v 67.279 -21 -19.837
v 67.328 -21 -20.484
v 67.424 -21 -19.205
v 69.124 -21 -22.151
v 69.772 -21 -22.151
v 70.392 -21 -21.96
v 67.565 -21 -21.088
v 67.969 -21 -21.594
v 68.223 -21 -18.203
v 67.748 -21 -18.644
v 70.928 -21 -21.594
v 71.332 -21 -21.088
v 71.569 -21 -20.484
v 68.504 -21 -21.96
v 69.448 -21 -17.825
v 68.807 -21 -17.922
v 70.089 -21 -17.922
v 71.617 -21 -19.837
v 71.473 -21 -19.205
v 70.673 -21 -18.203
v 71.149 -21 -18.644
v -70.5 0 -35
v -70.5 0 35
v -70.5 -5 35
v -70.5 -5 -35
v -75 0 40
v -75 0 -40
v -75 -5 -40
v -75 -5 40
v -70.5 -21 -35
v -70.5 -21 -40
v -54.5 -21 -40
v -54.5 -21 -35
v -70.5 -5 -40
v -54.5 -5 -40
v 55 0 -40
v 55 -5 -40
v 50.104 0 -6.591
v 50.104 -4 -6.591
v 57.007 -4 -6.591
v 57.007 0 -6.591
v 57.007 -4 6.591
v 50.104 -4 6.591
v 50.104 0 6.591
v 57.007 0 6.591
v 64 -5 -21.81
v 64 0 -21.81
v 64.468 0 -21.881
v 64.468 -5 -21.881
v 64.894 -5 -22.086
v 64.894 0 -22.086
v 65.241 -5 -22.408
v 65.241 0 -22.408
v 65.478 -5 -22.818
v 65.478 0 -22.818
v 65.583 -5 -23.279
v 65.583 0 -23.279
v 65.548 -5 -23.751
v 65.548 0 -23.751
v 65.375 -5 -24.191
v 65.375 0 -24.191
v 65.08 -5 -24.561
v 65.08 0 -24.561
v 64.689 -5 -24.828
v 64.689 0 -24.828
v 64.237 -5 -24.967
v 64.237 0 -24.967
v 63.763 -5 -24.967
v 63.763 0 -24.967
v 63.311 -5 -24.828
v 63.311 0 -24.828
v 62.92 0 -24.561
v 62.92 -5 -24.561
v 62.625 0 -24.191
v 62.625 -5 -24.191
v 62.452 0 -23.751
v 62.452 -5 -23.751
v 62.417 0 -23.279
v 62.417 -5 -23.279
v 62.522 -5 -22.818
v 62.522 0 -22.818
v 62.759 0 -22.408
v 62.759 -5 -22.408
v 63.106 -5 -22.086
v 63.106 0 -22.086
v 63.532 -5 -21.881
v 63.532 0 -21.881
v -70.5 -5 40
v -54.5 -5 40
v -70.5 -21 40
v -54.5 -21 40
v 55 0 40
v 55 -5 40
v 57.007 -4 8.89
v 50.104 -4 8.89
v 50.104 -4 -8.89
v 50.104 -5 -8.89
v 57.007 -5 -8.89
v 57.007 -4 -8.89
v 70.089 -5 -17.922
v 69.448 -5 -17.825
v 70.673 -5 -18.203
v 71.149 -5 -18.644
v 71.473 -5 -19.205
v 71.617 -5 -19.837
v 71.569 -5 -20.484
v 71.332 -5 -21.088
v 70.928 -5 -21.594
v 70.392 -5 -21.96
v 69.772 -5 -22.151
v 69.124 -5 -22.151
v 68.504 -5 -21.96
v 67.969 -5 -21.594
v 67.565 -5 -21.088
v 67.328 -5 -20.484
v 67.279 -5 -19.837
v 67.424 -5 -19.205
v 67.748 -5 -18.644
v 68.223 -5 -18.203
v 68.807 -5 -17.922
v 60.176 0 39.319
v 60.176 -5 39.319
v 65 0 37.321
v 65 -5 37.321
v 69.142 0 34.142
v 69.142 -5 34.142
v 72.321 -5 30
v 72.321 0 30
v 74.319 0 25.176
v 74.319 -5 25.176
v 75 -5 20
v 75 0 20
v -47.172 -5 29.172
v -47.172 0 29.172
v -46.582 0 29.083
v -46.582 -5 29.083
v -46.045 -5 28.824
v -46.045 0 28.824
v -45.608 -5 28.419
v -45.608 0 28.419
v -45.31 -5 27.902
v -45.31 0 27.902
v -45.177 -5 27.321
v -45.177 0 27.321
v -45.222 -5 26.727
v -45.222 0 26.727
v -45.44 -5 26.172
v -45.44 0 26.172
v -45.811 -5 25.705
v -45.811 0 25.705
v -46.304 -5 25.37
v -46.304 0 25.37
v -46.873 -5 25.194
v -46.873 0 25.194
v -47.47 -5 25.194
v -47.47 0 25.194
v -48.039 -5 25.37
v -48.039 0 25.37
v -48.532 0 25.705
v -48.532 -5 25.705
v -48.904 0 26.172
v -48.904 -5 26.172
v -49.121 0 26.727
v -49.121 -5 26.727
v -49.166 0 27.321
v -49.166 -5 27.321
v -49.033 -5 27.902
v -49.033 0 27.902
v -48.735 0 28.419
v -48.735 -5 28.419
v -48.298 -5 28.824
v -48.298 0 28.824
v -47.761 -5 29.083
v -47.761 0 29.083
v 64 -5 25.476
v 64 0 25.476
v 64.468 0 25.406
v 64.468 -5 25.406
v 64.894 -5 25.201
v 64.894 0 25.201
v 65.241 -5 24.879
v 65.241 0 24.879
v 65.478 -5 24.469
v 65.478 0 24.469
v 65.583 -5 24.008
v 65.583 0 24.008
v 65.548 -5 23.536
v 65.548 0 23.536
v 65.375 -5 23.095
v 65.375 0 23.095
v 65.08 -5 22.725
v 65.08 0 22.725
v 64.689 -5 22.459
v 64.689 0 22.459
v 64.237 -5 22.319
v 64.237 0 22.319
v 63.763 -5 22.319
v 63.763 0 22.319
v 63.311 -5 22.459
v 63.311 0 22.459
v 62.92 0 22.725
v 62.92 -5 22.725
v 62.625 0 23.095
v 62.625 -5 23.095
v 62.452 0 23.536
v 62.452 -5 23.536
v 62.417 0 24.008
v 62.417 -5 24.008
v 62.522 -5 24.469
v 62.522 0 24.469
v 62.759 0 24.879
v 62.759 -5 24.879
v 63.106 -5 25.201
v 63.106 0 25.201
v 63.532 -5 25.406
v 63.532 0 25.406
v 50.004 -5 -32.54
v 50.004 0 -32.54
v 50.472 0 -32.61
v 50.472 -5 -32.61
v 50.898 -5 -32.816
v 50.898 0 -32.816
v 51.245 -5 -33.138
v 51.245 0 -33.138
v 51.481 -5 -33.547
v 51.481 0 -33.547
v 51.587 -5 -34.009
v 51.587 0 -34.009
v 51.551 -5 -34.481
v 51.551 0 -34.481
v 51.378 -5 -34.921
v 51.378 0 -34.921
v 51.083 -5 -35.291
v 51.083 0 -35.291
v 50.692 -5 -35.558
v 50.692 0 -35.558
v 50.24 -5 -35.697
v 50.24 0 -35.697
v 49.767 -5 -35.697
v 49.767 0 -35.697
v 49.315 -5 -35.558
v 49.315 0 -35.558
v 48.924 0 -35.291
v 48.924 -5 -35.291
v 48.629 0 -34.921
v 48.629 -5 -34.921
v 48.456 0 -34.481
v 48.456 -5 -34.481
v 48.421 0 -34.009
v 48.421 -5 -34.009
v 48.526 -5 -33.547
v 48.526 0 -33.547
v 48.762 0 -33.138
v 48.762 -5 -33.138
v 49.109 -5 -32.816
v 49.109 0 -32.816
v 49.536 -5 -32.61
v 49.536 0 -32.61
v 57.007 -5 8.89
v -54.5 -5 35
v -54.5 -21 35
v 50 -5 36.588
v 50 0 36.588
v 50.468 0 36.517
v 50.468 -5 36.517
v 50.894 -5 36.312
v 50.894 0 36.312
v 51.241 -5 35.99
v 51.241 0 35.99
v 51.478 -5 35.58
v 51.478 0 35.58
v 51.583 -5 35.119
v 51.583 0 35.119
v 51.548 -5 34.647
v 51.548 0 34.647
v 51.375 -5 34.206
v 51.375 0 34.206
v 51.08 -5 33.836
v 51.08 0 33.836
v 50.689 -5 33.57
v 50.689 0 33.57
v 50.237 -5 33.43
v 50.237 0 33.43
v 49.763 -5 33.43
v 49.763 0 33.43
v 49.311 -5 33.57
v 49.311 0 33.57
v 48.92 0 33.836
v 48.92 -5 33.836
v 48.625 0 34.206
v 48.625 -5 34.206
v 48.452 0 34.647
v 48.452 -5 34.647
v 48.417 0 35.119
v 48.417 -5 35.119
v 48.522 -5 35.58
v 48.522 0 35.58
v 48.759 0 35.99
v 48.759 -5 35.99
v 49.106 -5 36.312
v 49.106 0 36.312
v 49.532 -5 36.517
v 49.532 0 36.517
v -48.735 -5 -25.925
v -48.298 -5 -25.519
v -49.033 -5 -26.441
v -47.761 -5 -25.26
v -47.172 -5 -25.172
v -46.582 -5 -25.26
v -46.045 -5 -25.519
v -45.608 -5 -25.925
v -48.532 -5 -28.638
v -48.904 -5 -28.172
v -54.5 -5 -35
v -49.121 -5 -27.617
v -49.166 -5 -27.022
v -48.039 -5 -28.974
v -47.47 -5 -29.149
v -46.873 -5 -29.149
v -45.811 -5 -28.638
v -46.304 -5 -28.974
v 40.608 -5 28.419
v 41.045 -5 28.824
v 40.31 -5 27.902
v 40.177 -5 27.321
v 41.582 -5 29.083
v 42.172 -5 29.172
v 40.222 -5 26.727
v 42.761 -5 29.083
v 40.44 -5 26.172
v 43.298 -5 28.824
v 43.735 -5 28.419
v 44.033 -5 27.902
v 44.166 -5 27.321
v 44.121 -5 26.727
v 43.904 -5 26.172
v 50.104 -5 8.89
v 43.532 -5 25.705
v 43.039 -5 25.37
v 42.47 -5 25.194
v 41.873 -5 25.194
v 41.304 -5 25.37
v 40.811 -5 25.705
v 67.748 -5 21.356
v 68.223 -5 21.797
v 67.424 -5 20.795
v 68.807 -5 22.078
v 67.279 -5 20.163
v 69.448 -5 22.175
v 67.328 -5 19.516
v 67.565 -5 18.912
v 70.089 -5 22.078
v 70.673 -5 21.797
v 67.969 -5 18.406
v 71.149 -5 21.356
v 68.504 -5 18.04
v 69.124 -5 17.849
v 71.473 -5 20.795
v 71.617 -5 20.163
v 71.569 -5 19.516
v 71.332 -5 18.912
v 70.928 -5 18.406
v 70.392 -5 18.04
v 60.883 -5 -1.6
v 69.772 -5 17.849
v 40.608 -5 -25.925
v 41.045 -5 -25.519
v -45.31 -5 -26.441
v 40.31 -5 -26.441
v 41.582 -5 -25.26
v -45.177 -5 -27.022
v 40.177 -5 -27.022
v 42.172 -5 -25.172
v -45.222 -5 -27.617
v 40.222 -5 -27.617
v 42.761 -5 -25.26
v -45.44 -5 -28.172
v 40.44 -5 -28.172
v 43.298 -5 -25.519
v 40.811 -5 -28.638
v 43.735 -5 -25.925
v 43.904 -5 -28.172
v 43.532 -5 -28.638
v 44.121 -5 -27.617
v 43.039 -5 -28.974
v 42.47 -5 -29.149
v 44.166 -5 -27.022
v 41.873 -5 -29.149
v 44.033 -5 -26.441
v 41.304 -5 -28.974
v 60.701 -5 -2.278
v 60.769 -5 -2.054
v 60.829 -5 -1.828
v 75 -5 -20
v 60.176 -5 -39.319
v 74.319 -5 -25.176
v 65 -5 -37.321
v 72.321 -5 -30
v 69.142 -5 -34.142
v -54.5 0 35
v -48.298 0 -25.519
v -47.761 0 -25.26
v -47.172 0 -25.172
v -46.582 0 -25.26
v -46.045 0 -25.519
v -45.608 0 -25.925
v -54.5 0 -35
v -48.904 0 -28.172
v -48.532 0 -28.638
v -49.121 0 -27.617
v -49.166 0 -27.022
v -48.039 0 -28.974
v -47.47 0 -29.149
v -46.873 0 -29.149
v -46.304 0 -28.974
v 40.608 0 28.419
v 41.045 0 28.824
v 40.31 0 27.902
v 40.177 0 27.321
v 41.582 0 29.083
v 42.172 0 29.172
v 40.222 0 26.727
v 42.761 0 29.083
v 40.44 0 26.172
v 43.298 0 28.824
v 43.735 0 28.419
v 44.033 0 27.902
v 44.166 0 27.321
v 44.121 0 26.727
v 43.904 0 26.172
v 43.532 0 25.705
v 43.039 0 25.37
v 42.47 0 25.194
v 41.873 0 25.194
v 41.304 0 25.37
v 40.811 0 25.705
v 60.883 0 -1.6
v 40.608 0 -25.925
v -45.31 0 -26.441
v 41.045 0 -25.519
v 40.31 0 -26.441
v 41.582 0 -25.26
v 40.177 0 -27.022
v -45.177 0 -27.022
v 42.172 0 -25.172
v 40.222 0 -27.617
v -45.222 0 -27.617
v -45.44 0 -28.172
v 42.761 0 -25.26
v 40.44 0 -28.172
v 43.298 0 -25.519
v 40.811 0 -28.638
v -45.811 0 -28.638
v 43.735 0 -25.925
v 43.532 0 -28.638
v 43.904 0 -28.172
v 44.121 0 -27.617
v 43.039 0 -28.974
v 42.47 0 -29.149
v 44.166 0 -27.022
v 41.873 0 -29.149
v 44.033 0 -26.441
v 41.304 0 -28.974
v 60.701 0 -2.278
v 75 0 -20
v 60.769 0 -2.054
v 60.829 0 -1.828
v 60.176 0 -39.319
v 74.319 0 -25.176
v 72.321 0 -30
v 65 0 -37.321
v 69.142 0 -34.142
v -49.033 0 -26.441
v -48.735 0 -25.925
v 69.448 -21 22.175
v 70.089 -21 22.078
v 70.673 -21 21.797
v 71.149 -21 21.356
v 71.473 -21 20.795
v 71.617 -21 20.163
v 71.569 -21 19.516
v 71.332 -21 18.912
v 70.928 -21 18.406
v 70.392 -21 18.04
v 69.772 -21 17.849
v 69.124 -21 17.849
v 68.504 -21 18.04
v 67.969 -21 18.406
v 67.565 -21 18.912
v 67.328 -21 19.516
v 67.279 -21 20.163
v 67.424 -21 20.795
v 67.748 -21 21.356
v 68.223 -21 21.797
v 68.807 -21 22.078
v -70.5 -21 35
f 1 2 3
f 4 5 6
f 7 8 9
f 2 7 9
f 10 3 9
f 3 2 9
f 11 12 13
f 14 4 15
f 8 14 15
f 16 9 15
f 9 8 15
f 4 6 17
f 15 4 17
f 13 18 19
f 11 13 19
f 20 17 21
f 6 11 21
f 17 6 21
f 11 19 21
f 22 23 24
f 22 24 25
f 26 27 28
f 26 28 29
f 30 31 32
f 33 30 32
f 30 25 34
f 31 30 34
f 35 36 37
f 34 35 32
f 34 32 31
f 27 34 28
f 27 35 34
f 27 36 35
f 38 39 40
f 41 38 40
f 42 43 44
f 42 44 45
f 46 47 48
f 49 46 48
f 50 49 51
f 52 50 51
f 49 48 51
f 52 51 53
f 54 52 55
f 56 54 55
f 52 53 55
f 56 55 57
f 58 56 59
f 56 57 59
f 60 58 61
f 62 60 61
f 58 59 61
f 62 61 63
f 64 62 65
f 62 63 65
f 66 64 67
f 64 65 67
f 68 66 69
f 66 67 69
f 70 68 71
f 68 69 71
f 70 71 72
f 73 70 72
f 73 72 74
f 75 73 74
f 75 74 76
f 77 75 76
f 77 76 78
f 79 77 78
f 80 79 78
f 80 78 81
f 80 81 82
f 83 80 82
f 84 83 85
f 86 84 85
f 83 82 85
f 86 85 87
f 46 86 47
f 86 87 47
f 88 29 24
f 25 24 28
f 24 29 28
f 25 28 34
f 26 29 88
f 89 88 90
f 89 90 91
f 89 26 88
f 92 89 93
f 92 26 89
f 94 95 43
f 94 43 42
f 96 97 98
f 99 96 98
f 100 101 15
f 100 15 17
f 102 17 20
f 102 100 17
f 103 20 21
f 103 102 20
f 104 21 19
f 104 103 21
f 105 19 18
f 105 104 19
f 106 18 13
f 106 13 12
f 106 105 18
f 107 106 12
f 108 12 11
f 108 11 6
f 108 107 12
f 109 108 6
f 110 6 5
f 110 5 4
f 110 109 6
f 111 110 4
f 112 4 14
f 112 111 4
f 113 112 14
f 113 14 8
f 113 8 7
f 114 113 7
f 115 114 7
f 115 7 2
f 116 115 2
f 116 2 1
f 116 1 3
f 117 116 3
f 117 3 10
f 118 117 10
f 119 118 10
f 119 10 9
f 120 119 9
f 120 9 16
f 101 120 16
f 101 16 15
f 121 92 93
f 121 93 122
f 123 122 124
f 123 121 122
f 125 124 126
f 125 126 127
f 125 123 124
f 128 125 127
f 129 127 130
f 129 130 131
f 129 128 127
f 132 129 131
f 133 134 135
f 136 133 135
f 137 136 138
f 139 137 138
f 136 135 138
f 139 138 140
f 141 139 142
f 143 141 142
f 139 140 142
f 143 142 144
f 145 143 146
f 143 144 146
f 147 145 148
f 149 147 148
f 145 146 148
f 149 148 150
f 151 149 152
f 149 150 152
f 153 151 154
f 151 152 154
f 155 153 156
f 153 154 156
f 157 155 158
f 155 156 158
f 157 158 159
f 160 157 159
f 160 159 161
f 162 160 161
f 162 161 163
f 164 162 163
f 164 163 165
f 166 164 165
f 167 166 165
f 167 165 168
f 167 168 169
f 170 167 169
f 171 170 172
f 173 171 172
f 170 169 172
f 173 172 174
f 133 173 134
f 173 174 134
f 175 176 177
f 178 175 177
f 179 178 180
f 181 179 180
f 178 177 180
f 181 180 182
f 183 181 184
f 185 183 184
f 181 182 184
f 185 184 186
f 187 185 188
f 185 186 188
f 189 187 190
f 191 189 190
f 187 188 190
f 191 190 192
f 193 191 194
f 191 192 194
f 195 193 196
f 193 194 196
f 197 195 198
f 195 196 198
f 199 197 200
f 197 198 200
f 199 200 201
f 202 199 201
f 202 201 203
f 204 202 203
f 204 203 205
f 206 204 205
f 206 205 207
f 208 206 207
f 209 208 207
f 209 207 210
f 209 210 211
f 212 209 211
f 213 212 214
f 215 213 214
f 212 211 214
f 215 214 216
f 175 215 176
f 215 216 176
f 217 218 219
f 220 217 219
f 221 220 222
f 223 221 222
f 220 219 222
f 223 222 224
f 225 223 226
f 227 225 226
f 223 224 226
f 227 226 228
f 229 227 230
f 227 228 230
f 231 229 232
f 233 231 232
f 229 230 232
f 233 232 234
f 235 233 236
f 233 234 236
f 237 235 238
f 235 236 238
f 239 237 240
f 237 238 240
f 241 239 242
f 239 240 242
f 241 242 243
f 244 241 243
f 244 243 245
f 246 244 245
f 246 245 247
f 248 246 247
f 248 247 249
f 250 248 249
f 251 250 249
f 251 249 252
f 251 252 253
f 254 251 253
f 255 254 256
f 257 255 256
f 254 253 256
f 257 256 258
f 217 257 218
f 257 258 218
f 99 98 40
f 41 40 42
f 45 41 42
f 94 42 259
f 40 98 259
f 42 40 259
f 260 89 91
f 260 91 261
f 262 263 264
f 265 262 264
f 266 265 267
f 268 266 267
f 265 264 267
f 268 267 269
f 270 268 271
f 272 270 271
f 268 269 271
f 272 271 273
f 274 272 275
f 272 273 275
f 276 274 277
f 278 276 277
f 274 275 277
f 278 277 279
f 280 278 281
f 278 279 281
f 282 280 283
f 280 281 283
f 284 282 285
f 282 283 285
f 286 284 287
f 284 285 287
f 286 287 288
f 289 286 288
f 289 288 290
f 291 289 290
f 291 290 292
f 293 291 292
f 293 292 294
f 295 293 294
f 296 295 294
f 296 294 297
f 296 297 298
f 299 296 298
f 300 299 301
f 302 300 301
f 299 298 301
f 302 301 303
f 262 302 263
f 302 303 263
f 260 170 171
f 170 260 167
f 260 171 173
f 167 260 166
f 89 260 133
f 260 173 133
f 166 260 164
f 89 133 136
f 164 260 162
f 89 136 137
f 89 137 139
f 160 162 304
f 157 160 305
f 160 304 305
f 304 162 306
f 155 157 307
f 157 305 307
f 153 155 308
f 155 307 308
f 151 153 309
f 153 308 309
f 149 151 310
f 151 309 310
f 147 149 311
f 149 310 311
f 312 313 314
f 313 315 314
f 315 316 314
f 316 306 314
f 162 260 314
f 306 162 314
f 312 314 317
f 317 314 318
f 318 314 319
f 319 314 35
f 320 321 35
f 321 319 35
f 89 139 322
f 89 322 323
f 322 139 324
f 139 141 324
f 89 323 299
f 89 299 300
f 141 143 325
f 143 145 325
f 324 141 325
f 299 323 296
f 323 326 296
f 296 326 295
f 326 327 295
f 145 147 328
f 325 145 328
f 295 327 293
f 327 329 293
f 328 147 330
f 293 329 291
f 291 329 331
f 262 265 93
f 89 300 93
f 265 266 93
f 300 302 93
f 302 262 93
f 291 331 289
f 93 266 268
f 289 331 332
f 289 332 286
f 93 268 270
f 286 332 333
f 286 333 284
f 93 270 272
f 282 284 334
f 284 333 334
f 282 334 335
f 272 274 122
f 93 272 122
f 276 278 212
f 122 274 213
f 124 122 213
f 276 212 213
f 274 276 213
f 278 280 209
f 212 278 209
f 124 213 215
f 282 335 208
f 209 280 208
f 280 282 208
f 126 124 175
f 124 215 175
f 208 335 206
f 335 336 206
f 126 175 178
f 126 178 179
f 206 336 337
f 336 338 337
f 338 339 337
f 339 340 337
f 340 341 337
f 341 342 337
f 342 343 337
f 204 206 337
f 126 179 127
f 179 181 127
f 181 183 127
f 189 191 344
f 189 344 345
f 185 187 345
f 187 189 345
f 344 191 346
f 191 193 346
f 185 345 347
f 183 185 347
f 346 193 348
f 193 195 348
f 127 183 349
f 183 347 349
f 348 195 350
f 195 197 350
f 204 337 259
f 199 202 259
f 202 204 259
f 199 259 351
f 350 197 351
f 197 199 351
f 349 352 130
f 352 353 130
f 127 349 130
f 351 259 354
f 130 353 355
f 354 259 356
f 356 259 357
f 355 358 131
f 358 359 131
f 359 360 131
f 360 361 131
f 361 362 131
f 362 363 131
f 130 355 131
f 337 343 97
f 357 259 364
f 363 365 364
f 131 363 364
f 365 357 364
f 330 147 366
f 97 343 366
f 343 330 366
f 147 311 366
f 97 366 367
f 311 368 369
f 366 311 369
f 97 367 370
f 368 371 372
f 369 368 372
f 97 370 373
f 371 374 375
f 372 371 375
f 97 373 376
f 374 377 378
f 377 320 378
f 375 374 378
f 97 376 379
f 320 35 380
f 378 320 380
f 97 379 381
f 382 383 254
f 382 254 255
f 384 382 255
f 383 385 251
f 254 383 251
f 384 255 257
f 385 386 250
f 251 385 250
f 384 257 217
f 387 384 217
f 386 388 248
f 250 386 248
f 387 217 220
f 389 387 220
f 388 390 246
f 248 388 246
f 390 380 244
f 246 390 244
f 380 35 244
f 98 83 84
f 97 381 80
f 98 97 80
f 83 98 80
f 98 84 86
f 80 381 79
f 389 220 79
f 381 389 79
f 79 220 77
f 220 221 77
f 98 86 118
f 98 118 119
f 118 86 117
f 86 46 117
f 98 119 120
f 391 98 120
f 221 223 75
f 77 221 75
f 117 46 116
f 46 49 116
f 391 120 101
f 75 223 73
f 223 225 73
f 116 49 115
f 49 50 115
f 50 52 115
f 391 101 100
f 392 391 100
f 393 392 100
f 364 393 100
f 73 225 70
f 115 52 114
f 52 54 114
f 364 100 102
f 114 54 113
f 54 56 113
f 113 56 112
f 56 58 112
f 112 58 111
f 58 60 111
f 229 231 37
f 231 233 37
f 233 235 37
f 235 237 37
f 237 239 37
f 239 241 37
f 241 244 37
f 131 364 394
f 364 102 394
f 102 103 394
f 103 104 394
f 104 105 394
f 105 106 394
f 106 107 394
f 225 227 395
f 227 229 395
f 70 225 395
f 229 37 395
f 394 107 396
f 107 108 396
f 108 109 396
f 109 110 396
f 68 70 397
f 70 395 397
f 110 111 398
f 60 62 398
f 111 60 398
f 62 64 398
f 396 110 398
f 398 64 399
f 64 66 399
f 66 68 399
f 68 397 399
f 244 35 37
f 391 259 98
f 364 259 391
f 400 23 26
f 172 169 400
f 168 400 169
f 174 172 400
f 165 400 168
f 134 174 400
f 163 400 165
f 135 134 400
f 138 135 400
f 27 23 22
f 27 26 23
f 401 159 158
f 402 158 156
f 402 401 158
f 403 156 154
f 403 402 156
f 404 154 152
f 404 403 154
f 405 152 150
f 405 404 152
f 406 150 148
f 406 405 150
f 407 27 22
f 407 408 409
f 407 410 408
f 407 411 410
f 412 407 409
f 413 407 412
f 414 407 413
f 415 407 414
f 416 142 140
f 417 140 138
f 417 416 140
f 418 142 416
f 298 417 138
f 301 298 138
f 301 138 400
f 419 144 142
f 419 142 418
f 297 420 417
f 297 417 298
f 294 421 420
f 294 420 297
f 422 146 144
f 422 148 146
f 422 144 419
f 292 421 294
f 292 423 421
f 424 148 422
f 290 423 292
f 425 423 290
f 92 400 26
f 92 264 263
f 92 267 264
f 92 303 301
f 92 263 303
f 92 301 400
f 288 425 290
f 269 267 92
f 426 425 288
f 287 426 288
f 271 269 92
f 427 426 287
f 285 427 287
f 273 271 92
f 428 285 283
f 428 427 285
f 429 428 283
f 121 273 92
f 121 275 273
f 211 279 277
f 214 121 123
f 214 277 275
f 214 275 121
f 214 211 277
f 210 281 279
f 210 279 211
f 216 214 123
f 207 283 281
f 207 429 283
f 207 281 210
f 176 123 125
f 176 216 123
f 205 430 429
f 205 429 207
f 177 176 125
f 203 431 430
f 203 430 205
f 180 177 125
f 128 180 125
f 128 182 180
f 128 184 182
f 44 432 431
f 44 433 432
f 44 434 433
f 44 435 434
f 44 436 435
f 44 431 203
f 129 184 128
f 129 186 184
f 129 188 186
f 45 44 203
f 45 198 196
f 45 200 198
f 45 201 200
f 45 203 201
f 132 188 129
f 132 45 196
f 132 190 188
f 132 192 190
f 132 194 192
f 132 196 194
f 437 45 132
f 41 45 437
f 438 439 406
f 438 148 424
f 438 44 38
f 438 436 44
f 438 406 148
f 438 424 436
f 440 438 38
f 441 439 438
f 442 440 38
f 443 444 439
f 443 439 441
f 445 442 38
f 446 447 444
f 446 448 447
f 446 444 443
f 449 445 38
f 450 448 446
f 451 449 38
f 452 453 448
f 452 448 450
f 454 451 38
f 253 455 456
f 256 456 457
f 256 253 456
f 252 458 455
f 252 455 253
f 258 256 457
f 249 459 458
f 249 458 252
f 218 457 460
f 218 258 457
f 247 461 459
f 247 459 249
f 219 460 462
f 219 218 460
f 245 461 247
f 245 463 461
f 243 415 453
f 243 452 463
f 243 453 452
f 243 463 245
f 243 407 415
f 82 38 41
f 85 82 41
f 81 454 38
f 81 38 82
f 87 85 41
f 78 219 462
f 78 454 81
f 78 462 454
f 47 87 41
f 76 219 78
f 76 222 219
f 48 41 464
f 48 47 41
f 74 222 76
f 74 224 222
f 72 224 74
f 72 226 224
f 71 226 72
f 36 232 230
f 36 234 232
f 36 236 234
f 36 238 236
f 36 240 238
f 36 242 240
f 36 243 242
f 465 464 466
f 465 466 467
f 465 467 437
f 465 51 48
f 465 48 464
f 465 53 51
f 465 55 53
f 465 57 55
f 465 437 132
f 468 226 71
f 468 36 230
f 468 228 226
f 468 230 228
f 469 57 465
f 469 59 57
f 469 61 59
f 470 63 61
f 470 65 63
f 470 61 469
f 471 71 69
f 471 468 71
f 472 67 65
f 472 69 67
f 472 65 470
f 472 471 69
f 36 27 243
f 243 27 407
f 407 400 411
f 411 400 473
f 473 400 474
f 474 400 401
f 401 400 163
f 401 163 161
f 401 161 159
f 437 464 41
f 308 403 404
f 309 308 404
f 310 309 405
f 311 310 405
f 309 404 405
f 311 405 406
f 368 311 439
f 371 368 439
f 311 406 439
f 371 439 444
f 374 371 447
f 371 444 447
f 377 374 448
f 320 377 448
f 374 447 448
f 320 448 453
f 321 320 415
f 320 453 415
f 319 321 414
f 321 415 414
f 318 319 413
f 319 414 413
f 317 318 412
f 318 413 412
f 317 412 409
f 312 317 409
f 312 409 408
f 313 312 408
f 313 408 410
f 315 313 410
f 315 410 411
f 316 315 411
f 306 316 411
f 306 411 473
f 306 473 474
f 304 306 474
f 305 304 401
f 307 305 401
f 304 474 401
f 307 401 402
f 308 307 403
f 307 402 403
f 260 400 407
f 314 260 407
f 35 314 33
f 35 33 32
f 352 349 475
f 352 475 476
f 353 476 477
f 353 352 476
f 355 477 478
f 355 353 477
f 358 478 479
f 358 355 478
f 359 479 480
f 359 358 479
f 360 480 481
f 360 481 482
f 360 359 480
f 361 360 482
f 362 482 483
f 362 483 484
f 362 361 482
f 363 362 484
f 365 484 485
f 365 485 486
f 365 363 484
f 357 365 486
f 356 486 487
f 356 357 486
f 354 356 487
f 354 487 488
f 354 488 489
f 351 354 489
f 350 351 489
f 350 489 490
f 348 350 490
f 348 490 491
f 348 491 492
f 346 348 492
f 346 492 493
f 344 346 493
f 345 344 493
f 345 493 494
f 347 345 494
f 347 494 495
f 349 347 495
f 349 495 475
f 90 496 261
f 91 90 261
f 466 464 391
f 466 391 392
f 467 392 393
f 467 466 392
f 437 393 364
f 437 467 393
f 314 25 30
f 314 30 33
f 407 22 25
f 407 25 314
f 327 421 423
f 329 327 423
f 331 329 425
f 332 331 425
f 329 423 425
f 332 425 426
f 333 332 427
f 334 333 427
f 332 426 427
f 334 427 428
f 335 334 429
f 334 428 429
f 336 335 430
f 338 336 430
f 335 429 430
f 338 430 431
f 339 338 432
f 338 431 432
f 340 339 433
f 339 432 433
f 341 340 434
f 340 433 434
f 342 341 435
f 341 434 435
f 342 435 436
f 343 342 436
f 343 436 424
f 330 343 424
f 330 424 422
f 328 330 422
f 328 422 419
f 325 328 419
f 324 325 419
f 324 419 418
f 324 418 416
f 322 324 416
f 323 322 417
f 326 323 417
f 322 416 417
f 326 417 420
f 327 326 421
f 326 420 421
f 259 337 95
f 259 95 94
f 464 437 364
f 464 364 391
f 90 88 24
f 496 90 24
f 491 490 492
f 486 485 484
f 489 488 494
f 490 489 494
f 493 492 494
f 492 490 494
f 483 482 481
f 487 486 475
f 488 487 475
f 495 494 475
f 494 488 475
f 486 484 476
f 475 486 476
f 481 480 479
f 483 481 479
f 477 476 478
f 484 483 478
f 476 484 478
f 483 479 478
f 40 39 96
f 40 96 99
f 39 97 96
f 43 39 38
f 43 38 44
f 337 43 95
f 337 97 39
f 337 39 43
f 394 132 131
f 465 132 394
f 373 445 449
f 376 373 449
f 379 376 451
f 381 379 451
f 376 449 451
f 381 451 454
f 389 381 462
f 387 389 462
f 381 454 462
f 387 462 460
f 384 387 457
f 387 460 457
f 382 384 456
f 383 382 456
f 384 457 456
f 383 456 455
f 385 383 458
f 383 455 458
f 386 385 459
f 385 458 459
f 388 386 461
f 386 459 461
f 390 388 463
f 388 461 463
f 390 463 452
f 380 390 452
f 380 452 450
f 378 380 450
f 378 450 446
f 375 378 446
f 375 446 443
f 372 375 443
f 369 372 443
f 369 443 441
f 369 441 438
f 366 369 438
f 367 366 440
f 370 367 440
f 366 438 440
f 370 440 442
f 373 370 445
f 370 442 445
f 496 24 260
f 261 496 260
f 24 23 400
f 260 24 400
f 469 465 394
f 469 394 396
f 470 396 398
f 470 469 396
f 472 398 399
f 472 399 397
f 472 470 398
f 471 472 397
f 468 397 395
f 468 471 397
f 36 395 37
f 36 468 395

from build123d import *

# Parameters (mm, degrees)
CROQUIS2_R              = 2
CROQUIS2_R_2            = 1.5875
CROQUIS2_R_3            = 2.175
CROQUIS2_W              = 16
CROQUIS2_H              = 70
SALIENTE_EXTRUIR1_DEPTH = 5
CROQUIS2_3_W            = 16
CROQUIS2_3_H            = 5
CROQUIS2_3_R            = 2.175
SALIENTE_EXTRUIR2_DEPTH = 21
CROQUIS4_W              = 6.902544823
CROQUIS4_H              = 13.181281006
CORTAR_EXTRUIR1_DEPTH   = 5
CROQUIS4_3_W            = 6.902544823
CROQUIS4_3_H            = 2.299613284
CORTAR_EXTRUIR2_DEPTH   = 1


with BuildPart() as part:
    # Croquis2 → Saliente-Extruir1 (new body)
    with BuildSketch(Plane(origin=(0, 0, 0), x_dir=(1, 0, 0), z_dir=(0, 1, 0))):
        with BuildLine():
            Line((-75, 40), (-75, -40))
            Line((-75, -40), (55, -40))
            ThreePointArc((55, -40), (69.142135624, -34.142135624), (75, -20))
            Line((75, -20), (75, 20))
            ThreePointArc((75, 20), (69.142135624, 34.142135624), (55, 40))
            Line((55, 40), (-75, 40))
        make_face()
        with Locations(Location((-47.171572875, -27.171572875, 0), (0, 0, 270))):
            Circle(CROQUIS2_R, mode=Mode.SUBTRACT)
        with Locations(Location((50, -35, 0), (0, 0, 270))):
            Circle(CROQUIS2_R_2, mode=Mode.SUBTRACT)
        with Locations(Location((42.171572875, -27.171572875, 0), (0, 0, 270))):
            Circle(CROQUIS2_R, mode=Mode.SUBTRACT)
        with Locations(Location((64, -23.888995042, 0), (0, 0, 270))):
            Circle(CROQUIS2_R_2, mode=Mode.SUBTRACT)
        with Locations(Location((69.44817995, -20, 0), (0, 0, 270))):
            Circle(CROQUIS2_R_3, mode=Mode.SUBTRACT)
        with Locations((-62.5, 0)):
            Rectangle(CROQUIS2_W, CROQUIS2_H, mode=Mode.SUBTRACT)
        with Locations(Location((-47.171572875, 27.171572875, 0), (0, 0, 270))):
            Circle(CROQUIS2_R, mode=Mode.SUBTRACT)
        with BuildLine():
            Line((54.218575207, 2.358517529), (54.281519289, 2.234982813))
            Line((54.281519289, 2.234982813), (54.405054005, 2.297926895))
            ThreePointArc((54.405054005, 2.297926895), (54.433330829, 2.287272045), (54.46147409, 2.276269253))
            Line((54.46147409, 2.276269253), (54.511160464, 2.146831825))
            Line((54.511160464, 2.146831825), (54.640597892, 2.196518199))
            ThreePointArc((54.640597892, 2.196518199), (54.667606077, 2.182965984), (54.694445062, 2.169081695))
            Line((54.694445062, 2.169081695), (54.730329352, 2.035159699))
            Line((54.730329352, 2.035159699), (54.864251349, 2.07104399))
            ThreePointArc((54.864251349, 2.07104399), (54.889694988, 2.054742891), (54.914935643, 2.038129224))
            Line((54.914935643, 2.038129224), (54.936624695, 1.901189937))
            Line((54.936624695, 1.901189937), (55.073563983, 1.922878989))
            ThreePointArc((55.073563983, 1.922878989), (55.09716431, 1.904007606), (55.120530093, 1.884846583))
            Line((55.120530093, 1.884846583), (55.127786277, 1.74639034))
            Line((55.127786277, 1.74639034), (55.26624252, 1.753646524))
            ThreePointArc((55.26624252, 1.753646524), (55.287740966, 1.732411614), (55.308975876, 1.710913168))
            Line((55.308975876, 1.710913168), (55.301719692, 1.572456925))
            Line((55.301719692, 1.572456925), (55.440175935, 1.565200741))
            ThreePointArc((55.440175935, 1.565200741), (55.459336958, 1.541834958), (55.478208342, 1.51823463))
            Line((55.478208342, 1.51823463), (55.456519289, 1.381295343))
            Line((55.456519289, 1.381295343), (55.593458577, 1.35960629))
            ThreePointArc((55.593458577, 1.35960629), (55.610072244, 1.334365636), (55.626373342, 1.308921996))
            Line((55.626373342, 1.308921996), (55.590489051, 1.175))
            Line((55.590489051, 1.175), (55.724411048, 1.139115709))
            ThreePointArc((55.724411048, 1.139115709), (55.738295337, 1.112276724), (55.751847551, 1.085268539))
            Line((55.751847551, 1.085268539), (55.702161178, 0.955831111))
            Line((55.702161178, 0.955831111), (55.831598606, 0.906144738))
            ThreePointArc((55.831598606, 0.906144738), (55.842601397, 0.878001476), (55.853256247, 0.849724653))
            Line((55.853256247, 0.849724653), (55.790312166, 0.726189937))
            Line((55.790312166, 0.726189937), (55.913846882, 0.663245855))
            ThreePointArc((55.913846882, 0.663245855), (55.921847627, 0.634106661), (55.929488376, 0.604871005))
            Line((55.929488376, 0.604871005), (55.853976214, 0.488592473))
            Line((55.853976214, 0.488592473), (55.970254746, 0.413080312))
            ThreePointArc((55.970254746, 0.413080312), (55.975165787, 0.383264439), (55.979708721, 0.353390264))
            Line((55.979708721, 0.353390264), (55.892455806, 0.245641889))
            Line((55.892455806, 0.245641889), (56.000204182, 0.158388975))
            ThreePointArc((56.000204182, 0.158388975), (56.001971713, 0.128223093), (56.003367058, 0.098037706))
            Line((56.003367058, 0.098037706), (55.905329352, 0))
            Line((55.905329352, 0), (56.003367058, -0.098037706))
            ThreePointArc((56.003367058, -0.098037706), (56.001971713, -0.128223093), (56.000204182, -0.158388975))
            Line((56.000204182, -0.158388975), (55.892455806, -0.245641889))
            Line((55.892455806, -0.245641889), (55.979708721, -0.353390264))
            ThreePointArc((55.979708721, -0.353390264), (55.975165787, -0.383264439), (55.970254746, -0.413080312))
            Line((55.970254746, -0.413080312), (55.853976214, -0.488592473))
            Line((55.853976214, -0.488592473), (55.929488376, -0.604871005))
            ThreePointArc((55.929488376, -0.604871005), (55.921847627, -0.634106661), (55.913846882, -0.663245855))
            Line((55.913846882, -0.663245855), (55.790312166, -0.726189937))
            Line((55.790312166, -0.726189937), (55.853256247, -0.849724653))
            ThreePointArc((55.853256247, -0.849724653), (55.842601397, -0.878001476), (55.831598606, -0.906144738))
            Line((55.831598606, -0.906144738), (55.702161178, -0.955831111))
            Line((55.702161178, -0.955831111), (55.751847551, -1.085268539))
            ThreePointArc((55.751847551, -1.085268539), (55.738295337, -1.112276724), (55.724411048, -1.139115709))
            Line((55.724411048, -1.139115709), (55.590489051, -1.175))
            Line((55.590489051, -1.175), (55.626373342, -1.308921996))
            ThreePointArc((55.626373342, -1.308921996), (55.610072244, -1.334365636), (55.593458577, -1.35960629))
            Line((55.593458577, -1.35960629), (55.456519289, -1.381295343))
            Line((55.456519289, -1.381295343), (55.478208342, -1.51823463))
            ThreePointArc((55.478208342, -1.51823463), (55.459336958, -1.541834958), (55.440175935, -1.565200741))
            Line((55.440175935, -1.565200741), (55.301719692, -1.572456925))
            Line((55.301719692, -1.572456925), (55.308975876, -1.710913168))
            ThreePointArc((55.308975876, -1.710913168), (55.287740966, -1.732411614), (55.26624252, -1.753646524))
            Line((55.26624252, -1.753646524), (55.127786277, -1.74639034))
            Line((55.127786277, -1.74639034), (55.120530093, -1.884846583))
            ThreePointArc((55.120530093, -1.884846583), (55.09716431, -1.904007606), (55.073563983, -1.922878989))
            Line((55.073563983, -1.922878989), (54.936624695, -1.901189937))
            Line((54.936624695, -1.901189937), (54.914935643, -2.038129224))
            ThreePointArc((54.914935643, -2.038129224), (54.889694988, -2.054742891), (54.864251349, -2.07104399))
            Line((54.864251349, -2.07104399), (54.730329352, -2.035159699))
            Line((54.730329352, -2.035159699), (54.694445062, -2.169081695))
            ThreePointArc((54.694445062, -2.169081695), (54.667606077, -2.182965984), (54.640597892, -2.196518199))
            Line((54.640597892, -2.196518199), (54.511160464, -2.146831825))
            Line((54.511160464, -2.146831825), (54.46147409, -2.276269253))
            ThreePointArc((54.46147409, -2.276269253), (54.433330829, -2.287272045), (54.405054005, -2.297926895))
            Line((54.405054005, -2.297926895), (54.281519289, -2.234982813))
            Line((54.281519289, -2.234982813), (54.218575207, -2.358517529))
            ThreePointArc((54.218575207, -2.358517529), (54.189436013, -2.366518274), (54.160200358, -2.374159023))
            Line((54.160200358, -2.374159023), (54.043921826, -2.298646862))
            Line((54.043921826, -2.298646862), (53.968409664, -2.414925393))
            ThreePointArc((53.968409664, -2.414925393), (53.938593792, -2.419836434), (53.908719617, -2.424379368))
            Line((53.908719617, -2.424379368), (53.800971241, -2.337126454))
            Line((53.800971241, -2.337126454), (53.713718327, -2.44487483))
            ThreePointArc((53.713718327, -2.44487483), (53.683552445, -2.44664236), (53.653367058, -2.448037706))
            Line((53.653367058, -2.448037706), (53.555329352, -2.35))
            Line((53.555329352, -2.35), (53.457291647, -2.448037706))
            ThreePointArc((53.457291647, -2.448037706), (53.42710626, -2.44664236), (53.396940378, -2.44487483))
            Line((53.396940378, -2.44487483), (53.309687464, -2.337126454))
            Line((53.309687464, -2.337126454), (53.201939088, -2.424379368))
            ThreePointArc((53.201939088, -2.424379368), (53.172064913, -2.419836434), (53.14224904, -2.414925393))
            Line((53.14224904, -2.414925393), (53.066736879, -2.298646862))
            Line((53.066736879, -2.298646862), (52.950458347, -2.374159023))
            ThreePointArc((52.950458347, -2.374159023), (52.921222692, -2.366518274), (52.892083497, -2.358517529))
            Line((52.892083497, -2.358517529), (52.829139416, -2.234982813))
            Line((52.829139416, -2.234982813), (52.7056047, -2.297926895))
            ThreePointArc((52.7056047, -2.297926895), (52.677327876, -2.287272045), (52.649184615, -2.276269253))
            Line((52.649184615, -2.276269253), (52.599498241, -2.146831825))
            Line((52.599498241, -2.146831825), (52.470060813, -2.196518199))
            ThreePointArc((52.470060813, -2.196518199), (52.443052628, -2.182965984), (52.416213643, -2.169081695))
            Line((52.416213643, -2.169081695), (52.380329352, -2.035159699))
            Line((52.380329352, -2.035159699), (52.246407356, -2.07104399))
            ThreePointArc((52.246407356, -2.07104399), (52.220963717, -2.054742891), (52.195723062, -2.038129224))
            Line((52.195723062, -2.038129224), (52.174034009, -1.901189937))
            Line((52.174034009, -1.901189937), (52.037094722, -1.922878989))
            ThreePointArc((52.037094722, -1.922878989), (52.013494394, -1.904007606), (51.990128612, -1.884846583))
            Line((51.990128612, -1.884846583), (51.982872427, -1.74639034))
            Line((51.982872427, -1.74639034), (51.844416184, -1.753646524))
            ThreePointArc((51.844416184, -1.753646524), (51.822917738, -1.732411614), (51.801682828, -1.710913168))
            Line((51.801682828, -1.710913168), (51.808939013, -1.572456925))
            Line((51.808939013, -1.572456925), (51.670482769, -1.565200741))
            ThreePointArc((51.670482769, -1.565200741), (51.651321747, -1.541834958), (51.632450363, -1.51823463))
            Line((51.632450363, -1.51823463), (51.654139416, -1.381295343))
            Line((51.654139416, -1.381295343), (51.517200128, -1.35960629))
            ThreePointArc((51.517200128, -1.35960629), (51.500586461, -1.334365636), (51.484285363, -1.308921996))
            Line((51.484285363, -1.308921996), (51.520169653, -1.175))
            Line((51.520169653, -1.175), (51.386247657, -1.139115709))
            ThreePointArc((51.386247657, -1.139115709), (51.372363368, -1.112276724), (51.358811154, -1.085268539))
            Line((51.358811154, -1.085268539), (51.408497527, -0.955831111))
            Line((51.408497527, -0.955831111), (51.279060099, -0.906144738))
            ThreePointArc((51.279060099, -0.906144738), (51.268057307, -0.878001476), (51.257402457, -0.849724653))
            Line((51.257402457, -0.849724653), (51.320346539, -0.726189937))
            Line((51.320346539, -0.726189937), (51.196811823, -0.663245855))
            ThreePointArc((51.196811823, -0.663245855), (51.188811078, -0.634106661), (51.181170329, -0.604871005))
            Line((51.181170329, -0.604871005), (51.256682491, -0.488592473))
            Line((51.256682491, -0.488592473), (51.140403959, -0.413080312))
            ThreePointArc((51.140403959, -0.413080312), (51.135492918, -0.383264439), (51.130949984, -0.353390264))
            Line((51.130949984, -0.353390264), (51.218202898, -0.245641889))
            Line((51.218202898, -0.245641889), (51.110454523, -0.158388975))
            ThreePointArc((51.110454523, -0.158388975), (51.108686992, -0.128223093), (51.107291647, -0.098037706))
            Line((51.107291647, -0.098037706), (51.205329352, 0))
            Line((51.205329352, 0), (51.107291647, 0.098037706))
            ThreePointArc((51.107291647, 0.098037706), (51.108686992, 0.128223093), (51.110454523, 0.158388975))
            Line((51.110454523, 0.158388975), (51.218202898, 0.245641889))
            Line((51.218202898, 0.245641889), (51.130949984, 0.353390264))
            ThreePointArc((51.130949984, 0.353390264), (51.135492918, 0.383264439), (51.140403959, 0.413080312))
            Line((51.140403959, 0.413080312), (51.256682491, 0.488592473))
            Line((51.256682491, 0.488592473), (51.181170329, 0.604871005))
            ThreePointArc((51.181170329, 0.604871005), (51.188811078, 0.634106661), (51.196811823, 0.663245855))
            Line((51.196811823, 0.663245855), (51.320346539, 0.726189937))
            Line((51.320346539, 0.726189937), (51.257402457, 0.849724653))
            ThreePointArc((51.257402457, 0.849724653), (51.268057307, 0.878001476), (51.279060099, 0.906144738))
            Line((51.279060099, 0.906144738), (51.408497527, 0.955831111))
            Line((51.408497527, 0.955831111), (51.358811154, 1.085268539))
            ThreePointArc((51.358811154, 1.085268539), (51.372363368, 1.112276724), (51.386247657, 1.139115709))
            Line((51.386247657, 1.139115709), (51.520169653, 1.175))
            Line((51.520169653, 1.175), (51.484285363, 1.308921996))
            ThreePointArc((51.484285363, 1.308921996), (51.500586461, 1.334365636), (51.517200128, 1.35960629))
            Line((51.517200128, 1.35960629), (51.654139416, 1.381295343))
            Line((51.654139416, 1.381295343), (51.632450363, 1.51823463))
            ThreePointArc((51.632450363, 1.51823463), (51.651321747, 1.541834958), (51.670482769, 1.565200741))
            Line((51.670482769, 1.565200741), (51.808939013, 1.572456925))
            Line((51.808939013, 1.572456925), (51.801682828, 1.710913168))
            ThreePointArc((51.801682828, 1.710913168), (51.822917738, 1.732411614), (51.844416184, 1.753646524))
            Line((51.844416184, 1.753646524), (51.982872427, 1.74639034))
            Line((51.982872427, 1.74639034), (51.990128612, 1.884846583))
            ThreePointArc((51.990128612, 1.884846583), (52.013494394, 1.904007606), (52.037094722, 1.922878989))
            Line((52.037094722, 1.922878989), (52.174034009, 1.901189937))
            Line((52.174034009, 1.901189937), (52.195723062, 2.038129224))
            ThreePointArc((52.195723062, 2.038129224), (52.220963717, 2.054742891), (52.246407356, 2.07104399))
            Line((52.246407356, 2.07104399), (52.380329352, 2.035159699))
            Line((52.380329352, 2.035159699), (52.416213643, 2.169081695))
            ThreePointArc((52.416213643, 2.169081695), (52.443052628, 2.182965984), (52.470060813, 2.196518199))
            Line((52.470060813, 2.196518199), (52.599498241, 2.146831825))
            Line((52.599498241, 2.146831825), (52.649184615, 2.276269253))
            ThreePointArc((52.649184615, 2.276269253), (52.677327876, 2.287272045), (52.7056047, 2.297926895))
            Line((52.7056047, 2.297926895), (52.829139416, 2.234982813))
            Line((52.829139416, 2.234982813), (52.892083497, 2.358517529))
            ThreePointArc((52.892083497, 2.358517529), (52.921222692, 2.366518274), (52.950458347, 2.374159023))
            Line((52.950458347, 2.374159023), (53.066736879, 2.298646862))
            Line((53.066736879, 2.298646862), (53.14224904, 2.414925393))
            ThreePointArc((53.14224904, 2.414925393), (53.172064913, 2.419836434), (53.201939088, 2.424379368))
            Line((53.201939088, 2.424379368), (53.309687464, 2.337126454))
            Line((53.309687464, 2.337126454), (53.396940378, 2.44487483))
            ThreePointArc((53.396940378, 2.44487483), (53.42710626, 2.44664236), (53.457291647, 2.448037706))
            Line((53.457291647, 2.448037706), (53.555329352, 2.35))
            Line((53.555329352, 2.35), (53.653367058, 2.448037706))
            ThreePointArc((53.653367058, 2.448037706), (53.683552445, 2.44664236), (53.713718327, 2.44487483))
            Line((53.713718327, 2.44487483), (53.800971241, 2.337126454))
            Line((53.800971241, 2.337126454), (53.908719617, 2.424379368))
            ThreePointArc((53.908719617, 2.424379368), (53.938593792, 2.419836434), (53.968409664, 2.414925393))
            Line((53.968409664, 2.414925393), (54.043921826, 2.298646862))
            Line((54.043921826, 2.298646862), (54.160200358, 2.374159023))
            ThreePointArc((54.160200358, 2.374159023), (54.189436013, 2.366518274), (54.218575207, 2.358517529))
        make_face(mode=Mode.SUBTRACT)
        with BuildLine():
            ThreePointArc((60.700997154, 2.278032411), (60.79977304, 1.941142874), (60.882675385, 1.600000035))
            Line((60.882675363, 1.60000003), (60.700997121, 2.2780324))
        make_face(mode=Mode.SUBTRACT)
        with Locations(Location((69.4481799, 20, 0), (0, 0, 270))):
            Circle(CROQUIS2_R_3, mode=Mode.SUBTRACT)
        with Locations(Location((64, 23.397724669, 0), (0, 0, 270))):
            Circle(CROQUIS2_R_2, mode=Mode.SUBTRACT)
        with Locations(Location((42.171572875, 27.171572875, 0), (0, 0, 270))):
            Circle(CROQUIS2_R, mode=Mode.SUBTRACT)
        with Locations(Location((50.003640725, 34.127468235, 0), (0, 0, 270))):
            Circle(CROQUIS2_R_2, mode=Mode.SUBTRACT)
    extrude(amount=-SALIENTE_EXTRUIR1_DEPTH)

    # Croquis2<3> → Saliente-Extruir2 (add)
    with BuildSketch(Plane(origin=(0, 0, 0), x_dir=(1, 0, 0), z_dir=(0, 1, 0))):
        with Locations((-62.5, 37.5)):
            Rectangle(CROQUIS2_3_W, CROQUIS2_3_H)
        with Locations((-62.5, -37.5)):
            Rectangle(CROQUIS2_3_W, CROQUIS2_3_H)
        with Locations(Location((69.4481799, 20, 0), (0, 0, 270))):
            Circle(CROQUIS2_3_R)
        with Locations(Location((69.44817995, -20, 0), (0, 0, 270))):
            Circle(CROQUIS2_3_R)
    extrude(amount=-SALIENTE_EXTRUIR2_DEPTH)

    # Croquis4 → Cortar-Extruir1 (cut)
    with BuildSketch(Plane.XZ.offset(5)):
        with Locations((53.555329353, 0)):
            Rectangle(CROQUIS4_W, CROQUIS4_H)
    extrude(amount=-CORTAR_EXTRUIR1_DEPTH, mode=Mode.SUBTRACT)

    # Croquis4<3> → Cortar-Extruir2 (cut)
    with BuildSketch(Plane.XZ.offset(5)):
        with Locations((53.555329353, 7.740447145)):
            Rectangle(CROQUIS4_3_W, CROQUIS4_3_H)
        with Locations((53.555329353, -7.740447145)):
            Rectangle(CROQUIS4_3_W, CROQUIS4_3_H)
    extrude(amount=-CORTAR_EXTRUIR2_DEPTH, mode=Mode.SUBTRACT)


solid = part.part
